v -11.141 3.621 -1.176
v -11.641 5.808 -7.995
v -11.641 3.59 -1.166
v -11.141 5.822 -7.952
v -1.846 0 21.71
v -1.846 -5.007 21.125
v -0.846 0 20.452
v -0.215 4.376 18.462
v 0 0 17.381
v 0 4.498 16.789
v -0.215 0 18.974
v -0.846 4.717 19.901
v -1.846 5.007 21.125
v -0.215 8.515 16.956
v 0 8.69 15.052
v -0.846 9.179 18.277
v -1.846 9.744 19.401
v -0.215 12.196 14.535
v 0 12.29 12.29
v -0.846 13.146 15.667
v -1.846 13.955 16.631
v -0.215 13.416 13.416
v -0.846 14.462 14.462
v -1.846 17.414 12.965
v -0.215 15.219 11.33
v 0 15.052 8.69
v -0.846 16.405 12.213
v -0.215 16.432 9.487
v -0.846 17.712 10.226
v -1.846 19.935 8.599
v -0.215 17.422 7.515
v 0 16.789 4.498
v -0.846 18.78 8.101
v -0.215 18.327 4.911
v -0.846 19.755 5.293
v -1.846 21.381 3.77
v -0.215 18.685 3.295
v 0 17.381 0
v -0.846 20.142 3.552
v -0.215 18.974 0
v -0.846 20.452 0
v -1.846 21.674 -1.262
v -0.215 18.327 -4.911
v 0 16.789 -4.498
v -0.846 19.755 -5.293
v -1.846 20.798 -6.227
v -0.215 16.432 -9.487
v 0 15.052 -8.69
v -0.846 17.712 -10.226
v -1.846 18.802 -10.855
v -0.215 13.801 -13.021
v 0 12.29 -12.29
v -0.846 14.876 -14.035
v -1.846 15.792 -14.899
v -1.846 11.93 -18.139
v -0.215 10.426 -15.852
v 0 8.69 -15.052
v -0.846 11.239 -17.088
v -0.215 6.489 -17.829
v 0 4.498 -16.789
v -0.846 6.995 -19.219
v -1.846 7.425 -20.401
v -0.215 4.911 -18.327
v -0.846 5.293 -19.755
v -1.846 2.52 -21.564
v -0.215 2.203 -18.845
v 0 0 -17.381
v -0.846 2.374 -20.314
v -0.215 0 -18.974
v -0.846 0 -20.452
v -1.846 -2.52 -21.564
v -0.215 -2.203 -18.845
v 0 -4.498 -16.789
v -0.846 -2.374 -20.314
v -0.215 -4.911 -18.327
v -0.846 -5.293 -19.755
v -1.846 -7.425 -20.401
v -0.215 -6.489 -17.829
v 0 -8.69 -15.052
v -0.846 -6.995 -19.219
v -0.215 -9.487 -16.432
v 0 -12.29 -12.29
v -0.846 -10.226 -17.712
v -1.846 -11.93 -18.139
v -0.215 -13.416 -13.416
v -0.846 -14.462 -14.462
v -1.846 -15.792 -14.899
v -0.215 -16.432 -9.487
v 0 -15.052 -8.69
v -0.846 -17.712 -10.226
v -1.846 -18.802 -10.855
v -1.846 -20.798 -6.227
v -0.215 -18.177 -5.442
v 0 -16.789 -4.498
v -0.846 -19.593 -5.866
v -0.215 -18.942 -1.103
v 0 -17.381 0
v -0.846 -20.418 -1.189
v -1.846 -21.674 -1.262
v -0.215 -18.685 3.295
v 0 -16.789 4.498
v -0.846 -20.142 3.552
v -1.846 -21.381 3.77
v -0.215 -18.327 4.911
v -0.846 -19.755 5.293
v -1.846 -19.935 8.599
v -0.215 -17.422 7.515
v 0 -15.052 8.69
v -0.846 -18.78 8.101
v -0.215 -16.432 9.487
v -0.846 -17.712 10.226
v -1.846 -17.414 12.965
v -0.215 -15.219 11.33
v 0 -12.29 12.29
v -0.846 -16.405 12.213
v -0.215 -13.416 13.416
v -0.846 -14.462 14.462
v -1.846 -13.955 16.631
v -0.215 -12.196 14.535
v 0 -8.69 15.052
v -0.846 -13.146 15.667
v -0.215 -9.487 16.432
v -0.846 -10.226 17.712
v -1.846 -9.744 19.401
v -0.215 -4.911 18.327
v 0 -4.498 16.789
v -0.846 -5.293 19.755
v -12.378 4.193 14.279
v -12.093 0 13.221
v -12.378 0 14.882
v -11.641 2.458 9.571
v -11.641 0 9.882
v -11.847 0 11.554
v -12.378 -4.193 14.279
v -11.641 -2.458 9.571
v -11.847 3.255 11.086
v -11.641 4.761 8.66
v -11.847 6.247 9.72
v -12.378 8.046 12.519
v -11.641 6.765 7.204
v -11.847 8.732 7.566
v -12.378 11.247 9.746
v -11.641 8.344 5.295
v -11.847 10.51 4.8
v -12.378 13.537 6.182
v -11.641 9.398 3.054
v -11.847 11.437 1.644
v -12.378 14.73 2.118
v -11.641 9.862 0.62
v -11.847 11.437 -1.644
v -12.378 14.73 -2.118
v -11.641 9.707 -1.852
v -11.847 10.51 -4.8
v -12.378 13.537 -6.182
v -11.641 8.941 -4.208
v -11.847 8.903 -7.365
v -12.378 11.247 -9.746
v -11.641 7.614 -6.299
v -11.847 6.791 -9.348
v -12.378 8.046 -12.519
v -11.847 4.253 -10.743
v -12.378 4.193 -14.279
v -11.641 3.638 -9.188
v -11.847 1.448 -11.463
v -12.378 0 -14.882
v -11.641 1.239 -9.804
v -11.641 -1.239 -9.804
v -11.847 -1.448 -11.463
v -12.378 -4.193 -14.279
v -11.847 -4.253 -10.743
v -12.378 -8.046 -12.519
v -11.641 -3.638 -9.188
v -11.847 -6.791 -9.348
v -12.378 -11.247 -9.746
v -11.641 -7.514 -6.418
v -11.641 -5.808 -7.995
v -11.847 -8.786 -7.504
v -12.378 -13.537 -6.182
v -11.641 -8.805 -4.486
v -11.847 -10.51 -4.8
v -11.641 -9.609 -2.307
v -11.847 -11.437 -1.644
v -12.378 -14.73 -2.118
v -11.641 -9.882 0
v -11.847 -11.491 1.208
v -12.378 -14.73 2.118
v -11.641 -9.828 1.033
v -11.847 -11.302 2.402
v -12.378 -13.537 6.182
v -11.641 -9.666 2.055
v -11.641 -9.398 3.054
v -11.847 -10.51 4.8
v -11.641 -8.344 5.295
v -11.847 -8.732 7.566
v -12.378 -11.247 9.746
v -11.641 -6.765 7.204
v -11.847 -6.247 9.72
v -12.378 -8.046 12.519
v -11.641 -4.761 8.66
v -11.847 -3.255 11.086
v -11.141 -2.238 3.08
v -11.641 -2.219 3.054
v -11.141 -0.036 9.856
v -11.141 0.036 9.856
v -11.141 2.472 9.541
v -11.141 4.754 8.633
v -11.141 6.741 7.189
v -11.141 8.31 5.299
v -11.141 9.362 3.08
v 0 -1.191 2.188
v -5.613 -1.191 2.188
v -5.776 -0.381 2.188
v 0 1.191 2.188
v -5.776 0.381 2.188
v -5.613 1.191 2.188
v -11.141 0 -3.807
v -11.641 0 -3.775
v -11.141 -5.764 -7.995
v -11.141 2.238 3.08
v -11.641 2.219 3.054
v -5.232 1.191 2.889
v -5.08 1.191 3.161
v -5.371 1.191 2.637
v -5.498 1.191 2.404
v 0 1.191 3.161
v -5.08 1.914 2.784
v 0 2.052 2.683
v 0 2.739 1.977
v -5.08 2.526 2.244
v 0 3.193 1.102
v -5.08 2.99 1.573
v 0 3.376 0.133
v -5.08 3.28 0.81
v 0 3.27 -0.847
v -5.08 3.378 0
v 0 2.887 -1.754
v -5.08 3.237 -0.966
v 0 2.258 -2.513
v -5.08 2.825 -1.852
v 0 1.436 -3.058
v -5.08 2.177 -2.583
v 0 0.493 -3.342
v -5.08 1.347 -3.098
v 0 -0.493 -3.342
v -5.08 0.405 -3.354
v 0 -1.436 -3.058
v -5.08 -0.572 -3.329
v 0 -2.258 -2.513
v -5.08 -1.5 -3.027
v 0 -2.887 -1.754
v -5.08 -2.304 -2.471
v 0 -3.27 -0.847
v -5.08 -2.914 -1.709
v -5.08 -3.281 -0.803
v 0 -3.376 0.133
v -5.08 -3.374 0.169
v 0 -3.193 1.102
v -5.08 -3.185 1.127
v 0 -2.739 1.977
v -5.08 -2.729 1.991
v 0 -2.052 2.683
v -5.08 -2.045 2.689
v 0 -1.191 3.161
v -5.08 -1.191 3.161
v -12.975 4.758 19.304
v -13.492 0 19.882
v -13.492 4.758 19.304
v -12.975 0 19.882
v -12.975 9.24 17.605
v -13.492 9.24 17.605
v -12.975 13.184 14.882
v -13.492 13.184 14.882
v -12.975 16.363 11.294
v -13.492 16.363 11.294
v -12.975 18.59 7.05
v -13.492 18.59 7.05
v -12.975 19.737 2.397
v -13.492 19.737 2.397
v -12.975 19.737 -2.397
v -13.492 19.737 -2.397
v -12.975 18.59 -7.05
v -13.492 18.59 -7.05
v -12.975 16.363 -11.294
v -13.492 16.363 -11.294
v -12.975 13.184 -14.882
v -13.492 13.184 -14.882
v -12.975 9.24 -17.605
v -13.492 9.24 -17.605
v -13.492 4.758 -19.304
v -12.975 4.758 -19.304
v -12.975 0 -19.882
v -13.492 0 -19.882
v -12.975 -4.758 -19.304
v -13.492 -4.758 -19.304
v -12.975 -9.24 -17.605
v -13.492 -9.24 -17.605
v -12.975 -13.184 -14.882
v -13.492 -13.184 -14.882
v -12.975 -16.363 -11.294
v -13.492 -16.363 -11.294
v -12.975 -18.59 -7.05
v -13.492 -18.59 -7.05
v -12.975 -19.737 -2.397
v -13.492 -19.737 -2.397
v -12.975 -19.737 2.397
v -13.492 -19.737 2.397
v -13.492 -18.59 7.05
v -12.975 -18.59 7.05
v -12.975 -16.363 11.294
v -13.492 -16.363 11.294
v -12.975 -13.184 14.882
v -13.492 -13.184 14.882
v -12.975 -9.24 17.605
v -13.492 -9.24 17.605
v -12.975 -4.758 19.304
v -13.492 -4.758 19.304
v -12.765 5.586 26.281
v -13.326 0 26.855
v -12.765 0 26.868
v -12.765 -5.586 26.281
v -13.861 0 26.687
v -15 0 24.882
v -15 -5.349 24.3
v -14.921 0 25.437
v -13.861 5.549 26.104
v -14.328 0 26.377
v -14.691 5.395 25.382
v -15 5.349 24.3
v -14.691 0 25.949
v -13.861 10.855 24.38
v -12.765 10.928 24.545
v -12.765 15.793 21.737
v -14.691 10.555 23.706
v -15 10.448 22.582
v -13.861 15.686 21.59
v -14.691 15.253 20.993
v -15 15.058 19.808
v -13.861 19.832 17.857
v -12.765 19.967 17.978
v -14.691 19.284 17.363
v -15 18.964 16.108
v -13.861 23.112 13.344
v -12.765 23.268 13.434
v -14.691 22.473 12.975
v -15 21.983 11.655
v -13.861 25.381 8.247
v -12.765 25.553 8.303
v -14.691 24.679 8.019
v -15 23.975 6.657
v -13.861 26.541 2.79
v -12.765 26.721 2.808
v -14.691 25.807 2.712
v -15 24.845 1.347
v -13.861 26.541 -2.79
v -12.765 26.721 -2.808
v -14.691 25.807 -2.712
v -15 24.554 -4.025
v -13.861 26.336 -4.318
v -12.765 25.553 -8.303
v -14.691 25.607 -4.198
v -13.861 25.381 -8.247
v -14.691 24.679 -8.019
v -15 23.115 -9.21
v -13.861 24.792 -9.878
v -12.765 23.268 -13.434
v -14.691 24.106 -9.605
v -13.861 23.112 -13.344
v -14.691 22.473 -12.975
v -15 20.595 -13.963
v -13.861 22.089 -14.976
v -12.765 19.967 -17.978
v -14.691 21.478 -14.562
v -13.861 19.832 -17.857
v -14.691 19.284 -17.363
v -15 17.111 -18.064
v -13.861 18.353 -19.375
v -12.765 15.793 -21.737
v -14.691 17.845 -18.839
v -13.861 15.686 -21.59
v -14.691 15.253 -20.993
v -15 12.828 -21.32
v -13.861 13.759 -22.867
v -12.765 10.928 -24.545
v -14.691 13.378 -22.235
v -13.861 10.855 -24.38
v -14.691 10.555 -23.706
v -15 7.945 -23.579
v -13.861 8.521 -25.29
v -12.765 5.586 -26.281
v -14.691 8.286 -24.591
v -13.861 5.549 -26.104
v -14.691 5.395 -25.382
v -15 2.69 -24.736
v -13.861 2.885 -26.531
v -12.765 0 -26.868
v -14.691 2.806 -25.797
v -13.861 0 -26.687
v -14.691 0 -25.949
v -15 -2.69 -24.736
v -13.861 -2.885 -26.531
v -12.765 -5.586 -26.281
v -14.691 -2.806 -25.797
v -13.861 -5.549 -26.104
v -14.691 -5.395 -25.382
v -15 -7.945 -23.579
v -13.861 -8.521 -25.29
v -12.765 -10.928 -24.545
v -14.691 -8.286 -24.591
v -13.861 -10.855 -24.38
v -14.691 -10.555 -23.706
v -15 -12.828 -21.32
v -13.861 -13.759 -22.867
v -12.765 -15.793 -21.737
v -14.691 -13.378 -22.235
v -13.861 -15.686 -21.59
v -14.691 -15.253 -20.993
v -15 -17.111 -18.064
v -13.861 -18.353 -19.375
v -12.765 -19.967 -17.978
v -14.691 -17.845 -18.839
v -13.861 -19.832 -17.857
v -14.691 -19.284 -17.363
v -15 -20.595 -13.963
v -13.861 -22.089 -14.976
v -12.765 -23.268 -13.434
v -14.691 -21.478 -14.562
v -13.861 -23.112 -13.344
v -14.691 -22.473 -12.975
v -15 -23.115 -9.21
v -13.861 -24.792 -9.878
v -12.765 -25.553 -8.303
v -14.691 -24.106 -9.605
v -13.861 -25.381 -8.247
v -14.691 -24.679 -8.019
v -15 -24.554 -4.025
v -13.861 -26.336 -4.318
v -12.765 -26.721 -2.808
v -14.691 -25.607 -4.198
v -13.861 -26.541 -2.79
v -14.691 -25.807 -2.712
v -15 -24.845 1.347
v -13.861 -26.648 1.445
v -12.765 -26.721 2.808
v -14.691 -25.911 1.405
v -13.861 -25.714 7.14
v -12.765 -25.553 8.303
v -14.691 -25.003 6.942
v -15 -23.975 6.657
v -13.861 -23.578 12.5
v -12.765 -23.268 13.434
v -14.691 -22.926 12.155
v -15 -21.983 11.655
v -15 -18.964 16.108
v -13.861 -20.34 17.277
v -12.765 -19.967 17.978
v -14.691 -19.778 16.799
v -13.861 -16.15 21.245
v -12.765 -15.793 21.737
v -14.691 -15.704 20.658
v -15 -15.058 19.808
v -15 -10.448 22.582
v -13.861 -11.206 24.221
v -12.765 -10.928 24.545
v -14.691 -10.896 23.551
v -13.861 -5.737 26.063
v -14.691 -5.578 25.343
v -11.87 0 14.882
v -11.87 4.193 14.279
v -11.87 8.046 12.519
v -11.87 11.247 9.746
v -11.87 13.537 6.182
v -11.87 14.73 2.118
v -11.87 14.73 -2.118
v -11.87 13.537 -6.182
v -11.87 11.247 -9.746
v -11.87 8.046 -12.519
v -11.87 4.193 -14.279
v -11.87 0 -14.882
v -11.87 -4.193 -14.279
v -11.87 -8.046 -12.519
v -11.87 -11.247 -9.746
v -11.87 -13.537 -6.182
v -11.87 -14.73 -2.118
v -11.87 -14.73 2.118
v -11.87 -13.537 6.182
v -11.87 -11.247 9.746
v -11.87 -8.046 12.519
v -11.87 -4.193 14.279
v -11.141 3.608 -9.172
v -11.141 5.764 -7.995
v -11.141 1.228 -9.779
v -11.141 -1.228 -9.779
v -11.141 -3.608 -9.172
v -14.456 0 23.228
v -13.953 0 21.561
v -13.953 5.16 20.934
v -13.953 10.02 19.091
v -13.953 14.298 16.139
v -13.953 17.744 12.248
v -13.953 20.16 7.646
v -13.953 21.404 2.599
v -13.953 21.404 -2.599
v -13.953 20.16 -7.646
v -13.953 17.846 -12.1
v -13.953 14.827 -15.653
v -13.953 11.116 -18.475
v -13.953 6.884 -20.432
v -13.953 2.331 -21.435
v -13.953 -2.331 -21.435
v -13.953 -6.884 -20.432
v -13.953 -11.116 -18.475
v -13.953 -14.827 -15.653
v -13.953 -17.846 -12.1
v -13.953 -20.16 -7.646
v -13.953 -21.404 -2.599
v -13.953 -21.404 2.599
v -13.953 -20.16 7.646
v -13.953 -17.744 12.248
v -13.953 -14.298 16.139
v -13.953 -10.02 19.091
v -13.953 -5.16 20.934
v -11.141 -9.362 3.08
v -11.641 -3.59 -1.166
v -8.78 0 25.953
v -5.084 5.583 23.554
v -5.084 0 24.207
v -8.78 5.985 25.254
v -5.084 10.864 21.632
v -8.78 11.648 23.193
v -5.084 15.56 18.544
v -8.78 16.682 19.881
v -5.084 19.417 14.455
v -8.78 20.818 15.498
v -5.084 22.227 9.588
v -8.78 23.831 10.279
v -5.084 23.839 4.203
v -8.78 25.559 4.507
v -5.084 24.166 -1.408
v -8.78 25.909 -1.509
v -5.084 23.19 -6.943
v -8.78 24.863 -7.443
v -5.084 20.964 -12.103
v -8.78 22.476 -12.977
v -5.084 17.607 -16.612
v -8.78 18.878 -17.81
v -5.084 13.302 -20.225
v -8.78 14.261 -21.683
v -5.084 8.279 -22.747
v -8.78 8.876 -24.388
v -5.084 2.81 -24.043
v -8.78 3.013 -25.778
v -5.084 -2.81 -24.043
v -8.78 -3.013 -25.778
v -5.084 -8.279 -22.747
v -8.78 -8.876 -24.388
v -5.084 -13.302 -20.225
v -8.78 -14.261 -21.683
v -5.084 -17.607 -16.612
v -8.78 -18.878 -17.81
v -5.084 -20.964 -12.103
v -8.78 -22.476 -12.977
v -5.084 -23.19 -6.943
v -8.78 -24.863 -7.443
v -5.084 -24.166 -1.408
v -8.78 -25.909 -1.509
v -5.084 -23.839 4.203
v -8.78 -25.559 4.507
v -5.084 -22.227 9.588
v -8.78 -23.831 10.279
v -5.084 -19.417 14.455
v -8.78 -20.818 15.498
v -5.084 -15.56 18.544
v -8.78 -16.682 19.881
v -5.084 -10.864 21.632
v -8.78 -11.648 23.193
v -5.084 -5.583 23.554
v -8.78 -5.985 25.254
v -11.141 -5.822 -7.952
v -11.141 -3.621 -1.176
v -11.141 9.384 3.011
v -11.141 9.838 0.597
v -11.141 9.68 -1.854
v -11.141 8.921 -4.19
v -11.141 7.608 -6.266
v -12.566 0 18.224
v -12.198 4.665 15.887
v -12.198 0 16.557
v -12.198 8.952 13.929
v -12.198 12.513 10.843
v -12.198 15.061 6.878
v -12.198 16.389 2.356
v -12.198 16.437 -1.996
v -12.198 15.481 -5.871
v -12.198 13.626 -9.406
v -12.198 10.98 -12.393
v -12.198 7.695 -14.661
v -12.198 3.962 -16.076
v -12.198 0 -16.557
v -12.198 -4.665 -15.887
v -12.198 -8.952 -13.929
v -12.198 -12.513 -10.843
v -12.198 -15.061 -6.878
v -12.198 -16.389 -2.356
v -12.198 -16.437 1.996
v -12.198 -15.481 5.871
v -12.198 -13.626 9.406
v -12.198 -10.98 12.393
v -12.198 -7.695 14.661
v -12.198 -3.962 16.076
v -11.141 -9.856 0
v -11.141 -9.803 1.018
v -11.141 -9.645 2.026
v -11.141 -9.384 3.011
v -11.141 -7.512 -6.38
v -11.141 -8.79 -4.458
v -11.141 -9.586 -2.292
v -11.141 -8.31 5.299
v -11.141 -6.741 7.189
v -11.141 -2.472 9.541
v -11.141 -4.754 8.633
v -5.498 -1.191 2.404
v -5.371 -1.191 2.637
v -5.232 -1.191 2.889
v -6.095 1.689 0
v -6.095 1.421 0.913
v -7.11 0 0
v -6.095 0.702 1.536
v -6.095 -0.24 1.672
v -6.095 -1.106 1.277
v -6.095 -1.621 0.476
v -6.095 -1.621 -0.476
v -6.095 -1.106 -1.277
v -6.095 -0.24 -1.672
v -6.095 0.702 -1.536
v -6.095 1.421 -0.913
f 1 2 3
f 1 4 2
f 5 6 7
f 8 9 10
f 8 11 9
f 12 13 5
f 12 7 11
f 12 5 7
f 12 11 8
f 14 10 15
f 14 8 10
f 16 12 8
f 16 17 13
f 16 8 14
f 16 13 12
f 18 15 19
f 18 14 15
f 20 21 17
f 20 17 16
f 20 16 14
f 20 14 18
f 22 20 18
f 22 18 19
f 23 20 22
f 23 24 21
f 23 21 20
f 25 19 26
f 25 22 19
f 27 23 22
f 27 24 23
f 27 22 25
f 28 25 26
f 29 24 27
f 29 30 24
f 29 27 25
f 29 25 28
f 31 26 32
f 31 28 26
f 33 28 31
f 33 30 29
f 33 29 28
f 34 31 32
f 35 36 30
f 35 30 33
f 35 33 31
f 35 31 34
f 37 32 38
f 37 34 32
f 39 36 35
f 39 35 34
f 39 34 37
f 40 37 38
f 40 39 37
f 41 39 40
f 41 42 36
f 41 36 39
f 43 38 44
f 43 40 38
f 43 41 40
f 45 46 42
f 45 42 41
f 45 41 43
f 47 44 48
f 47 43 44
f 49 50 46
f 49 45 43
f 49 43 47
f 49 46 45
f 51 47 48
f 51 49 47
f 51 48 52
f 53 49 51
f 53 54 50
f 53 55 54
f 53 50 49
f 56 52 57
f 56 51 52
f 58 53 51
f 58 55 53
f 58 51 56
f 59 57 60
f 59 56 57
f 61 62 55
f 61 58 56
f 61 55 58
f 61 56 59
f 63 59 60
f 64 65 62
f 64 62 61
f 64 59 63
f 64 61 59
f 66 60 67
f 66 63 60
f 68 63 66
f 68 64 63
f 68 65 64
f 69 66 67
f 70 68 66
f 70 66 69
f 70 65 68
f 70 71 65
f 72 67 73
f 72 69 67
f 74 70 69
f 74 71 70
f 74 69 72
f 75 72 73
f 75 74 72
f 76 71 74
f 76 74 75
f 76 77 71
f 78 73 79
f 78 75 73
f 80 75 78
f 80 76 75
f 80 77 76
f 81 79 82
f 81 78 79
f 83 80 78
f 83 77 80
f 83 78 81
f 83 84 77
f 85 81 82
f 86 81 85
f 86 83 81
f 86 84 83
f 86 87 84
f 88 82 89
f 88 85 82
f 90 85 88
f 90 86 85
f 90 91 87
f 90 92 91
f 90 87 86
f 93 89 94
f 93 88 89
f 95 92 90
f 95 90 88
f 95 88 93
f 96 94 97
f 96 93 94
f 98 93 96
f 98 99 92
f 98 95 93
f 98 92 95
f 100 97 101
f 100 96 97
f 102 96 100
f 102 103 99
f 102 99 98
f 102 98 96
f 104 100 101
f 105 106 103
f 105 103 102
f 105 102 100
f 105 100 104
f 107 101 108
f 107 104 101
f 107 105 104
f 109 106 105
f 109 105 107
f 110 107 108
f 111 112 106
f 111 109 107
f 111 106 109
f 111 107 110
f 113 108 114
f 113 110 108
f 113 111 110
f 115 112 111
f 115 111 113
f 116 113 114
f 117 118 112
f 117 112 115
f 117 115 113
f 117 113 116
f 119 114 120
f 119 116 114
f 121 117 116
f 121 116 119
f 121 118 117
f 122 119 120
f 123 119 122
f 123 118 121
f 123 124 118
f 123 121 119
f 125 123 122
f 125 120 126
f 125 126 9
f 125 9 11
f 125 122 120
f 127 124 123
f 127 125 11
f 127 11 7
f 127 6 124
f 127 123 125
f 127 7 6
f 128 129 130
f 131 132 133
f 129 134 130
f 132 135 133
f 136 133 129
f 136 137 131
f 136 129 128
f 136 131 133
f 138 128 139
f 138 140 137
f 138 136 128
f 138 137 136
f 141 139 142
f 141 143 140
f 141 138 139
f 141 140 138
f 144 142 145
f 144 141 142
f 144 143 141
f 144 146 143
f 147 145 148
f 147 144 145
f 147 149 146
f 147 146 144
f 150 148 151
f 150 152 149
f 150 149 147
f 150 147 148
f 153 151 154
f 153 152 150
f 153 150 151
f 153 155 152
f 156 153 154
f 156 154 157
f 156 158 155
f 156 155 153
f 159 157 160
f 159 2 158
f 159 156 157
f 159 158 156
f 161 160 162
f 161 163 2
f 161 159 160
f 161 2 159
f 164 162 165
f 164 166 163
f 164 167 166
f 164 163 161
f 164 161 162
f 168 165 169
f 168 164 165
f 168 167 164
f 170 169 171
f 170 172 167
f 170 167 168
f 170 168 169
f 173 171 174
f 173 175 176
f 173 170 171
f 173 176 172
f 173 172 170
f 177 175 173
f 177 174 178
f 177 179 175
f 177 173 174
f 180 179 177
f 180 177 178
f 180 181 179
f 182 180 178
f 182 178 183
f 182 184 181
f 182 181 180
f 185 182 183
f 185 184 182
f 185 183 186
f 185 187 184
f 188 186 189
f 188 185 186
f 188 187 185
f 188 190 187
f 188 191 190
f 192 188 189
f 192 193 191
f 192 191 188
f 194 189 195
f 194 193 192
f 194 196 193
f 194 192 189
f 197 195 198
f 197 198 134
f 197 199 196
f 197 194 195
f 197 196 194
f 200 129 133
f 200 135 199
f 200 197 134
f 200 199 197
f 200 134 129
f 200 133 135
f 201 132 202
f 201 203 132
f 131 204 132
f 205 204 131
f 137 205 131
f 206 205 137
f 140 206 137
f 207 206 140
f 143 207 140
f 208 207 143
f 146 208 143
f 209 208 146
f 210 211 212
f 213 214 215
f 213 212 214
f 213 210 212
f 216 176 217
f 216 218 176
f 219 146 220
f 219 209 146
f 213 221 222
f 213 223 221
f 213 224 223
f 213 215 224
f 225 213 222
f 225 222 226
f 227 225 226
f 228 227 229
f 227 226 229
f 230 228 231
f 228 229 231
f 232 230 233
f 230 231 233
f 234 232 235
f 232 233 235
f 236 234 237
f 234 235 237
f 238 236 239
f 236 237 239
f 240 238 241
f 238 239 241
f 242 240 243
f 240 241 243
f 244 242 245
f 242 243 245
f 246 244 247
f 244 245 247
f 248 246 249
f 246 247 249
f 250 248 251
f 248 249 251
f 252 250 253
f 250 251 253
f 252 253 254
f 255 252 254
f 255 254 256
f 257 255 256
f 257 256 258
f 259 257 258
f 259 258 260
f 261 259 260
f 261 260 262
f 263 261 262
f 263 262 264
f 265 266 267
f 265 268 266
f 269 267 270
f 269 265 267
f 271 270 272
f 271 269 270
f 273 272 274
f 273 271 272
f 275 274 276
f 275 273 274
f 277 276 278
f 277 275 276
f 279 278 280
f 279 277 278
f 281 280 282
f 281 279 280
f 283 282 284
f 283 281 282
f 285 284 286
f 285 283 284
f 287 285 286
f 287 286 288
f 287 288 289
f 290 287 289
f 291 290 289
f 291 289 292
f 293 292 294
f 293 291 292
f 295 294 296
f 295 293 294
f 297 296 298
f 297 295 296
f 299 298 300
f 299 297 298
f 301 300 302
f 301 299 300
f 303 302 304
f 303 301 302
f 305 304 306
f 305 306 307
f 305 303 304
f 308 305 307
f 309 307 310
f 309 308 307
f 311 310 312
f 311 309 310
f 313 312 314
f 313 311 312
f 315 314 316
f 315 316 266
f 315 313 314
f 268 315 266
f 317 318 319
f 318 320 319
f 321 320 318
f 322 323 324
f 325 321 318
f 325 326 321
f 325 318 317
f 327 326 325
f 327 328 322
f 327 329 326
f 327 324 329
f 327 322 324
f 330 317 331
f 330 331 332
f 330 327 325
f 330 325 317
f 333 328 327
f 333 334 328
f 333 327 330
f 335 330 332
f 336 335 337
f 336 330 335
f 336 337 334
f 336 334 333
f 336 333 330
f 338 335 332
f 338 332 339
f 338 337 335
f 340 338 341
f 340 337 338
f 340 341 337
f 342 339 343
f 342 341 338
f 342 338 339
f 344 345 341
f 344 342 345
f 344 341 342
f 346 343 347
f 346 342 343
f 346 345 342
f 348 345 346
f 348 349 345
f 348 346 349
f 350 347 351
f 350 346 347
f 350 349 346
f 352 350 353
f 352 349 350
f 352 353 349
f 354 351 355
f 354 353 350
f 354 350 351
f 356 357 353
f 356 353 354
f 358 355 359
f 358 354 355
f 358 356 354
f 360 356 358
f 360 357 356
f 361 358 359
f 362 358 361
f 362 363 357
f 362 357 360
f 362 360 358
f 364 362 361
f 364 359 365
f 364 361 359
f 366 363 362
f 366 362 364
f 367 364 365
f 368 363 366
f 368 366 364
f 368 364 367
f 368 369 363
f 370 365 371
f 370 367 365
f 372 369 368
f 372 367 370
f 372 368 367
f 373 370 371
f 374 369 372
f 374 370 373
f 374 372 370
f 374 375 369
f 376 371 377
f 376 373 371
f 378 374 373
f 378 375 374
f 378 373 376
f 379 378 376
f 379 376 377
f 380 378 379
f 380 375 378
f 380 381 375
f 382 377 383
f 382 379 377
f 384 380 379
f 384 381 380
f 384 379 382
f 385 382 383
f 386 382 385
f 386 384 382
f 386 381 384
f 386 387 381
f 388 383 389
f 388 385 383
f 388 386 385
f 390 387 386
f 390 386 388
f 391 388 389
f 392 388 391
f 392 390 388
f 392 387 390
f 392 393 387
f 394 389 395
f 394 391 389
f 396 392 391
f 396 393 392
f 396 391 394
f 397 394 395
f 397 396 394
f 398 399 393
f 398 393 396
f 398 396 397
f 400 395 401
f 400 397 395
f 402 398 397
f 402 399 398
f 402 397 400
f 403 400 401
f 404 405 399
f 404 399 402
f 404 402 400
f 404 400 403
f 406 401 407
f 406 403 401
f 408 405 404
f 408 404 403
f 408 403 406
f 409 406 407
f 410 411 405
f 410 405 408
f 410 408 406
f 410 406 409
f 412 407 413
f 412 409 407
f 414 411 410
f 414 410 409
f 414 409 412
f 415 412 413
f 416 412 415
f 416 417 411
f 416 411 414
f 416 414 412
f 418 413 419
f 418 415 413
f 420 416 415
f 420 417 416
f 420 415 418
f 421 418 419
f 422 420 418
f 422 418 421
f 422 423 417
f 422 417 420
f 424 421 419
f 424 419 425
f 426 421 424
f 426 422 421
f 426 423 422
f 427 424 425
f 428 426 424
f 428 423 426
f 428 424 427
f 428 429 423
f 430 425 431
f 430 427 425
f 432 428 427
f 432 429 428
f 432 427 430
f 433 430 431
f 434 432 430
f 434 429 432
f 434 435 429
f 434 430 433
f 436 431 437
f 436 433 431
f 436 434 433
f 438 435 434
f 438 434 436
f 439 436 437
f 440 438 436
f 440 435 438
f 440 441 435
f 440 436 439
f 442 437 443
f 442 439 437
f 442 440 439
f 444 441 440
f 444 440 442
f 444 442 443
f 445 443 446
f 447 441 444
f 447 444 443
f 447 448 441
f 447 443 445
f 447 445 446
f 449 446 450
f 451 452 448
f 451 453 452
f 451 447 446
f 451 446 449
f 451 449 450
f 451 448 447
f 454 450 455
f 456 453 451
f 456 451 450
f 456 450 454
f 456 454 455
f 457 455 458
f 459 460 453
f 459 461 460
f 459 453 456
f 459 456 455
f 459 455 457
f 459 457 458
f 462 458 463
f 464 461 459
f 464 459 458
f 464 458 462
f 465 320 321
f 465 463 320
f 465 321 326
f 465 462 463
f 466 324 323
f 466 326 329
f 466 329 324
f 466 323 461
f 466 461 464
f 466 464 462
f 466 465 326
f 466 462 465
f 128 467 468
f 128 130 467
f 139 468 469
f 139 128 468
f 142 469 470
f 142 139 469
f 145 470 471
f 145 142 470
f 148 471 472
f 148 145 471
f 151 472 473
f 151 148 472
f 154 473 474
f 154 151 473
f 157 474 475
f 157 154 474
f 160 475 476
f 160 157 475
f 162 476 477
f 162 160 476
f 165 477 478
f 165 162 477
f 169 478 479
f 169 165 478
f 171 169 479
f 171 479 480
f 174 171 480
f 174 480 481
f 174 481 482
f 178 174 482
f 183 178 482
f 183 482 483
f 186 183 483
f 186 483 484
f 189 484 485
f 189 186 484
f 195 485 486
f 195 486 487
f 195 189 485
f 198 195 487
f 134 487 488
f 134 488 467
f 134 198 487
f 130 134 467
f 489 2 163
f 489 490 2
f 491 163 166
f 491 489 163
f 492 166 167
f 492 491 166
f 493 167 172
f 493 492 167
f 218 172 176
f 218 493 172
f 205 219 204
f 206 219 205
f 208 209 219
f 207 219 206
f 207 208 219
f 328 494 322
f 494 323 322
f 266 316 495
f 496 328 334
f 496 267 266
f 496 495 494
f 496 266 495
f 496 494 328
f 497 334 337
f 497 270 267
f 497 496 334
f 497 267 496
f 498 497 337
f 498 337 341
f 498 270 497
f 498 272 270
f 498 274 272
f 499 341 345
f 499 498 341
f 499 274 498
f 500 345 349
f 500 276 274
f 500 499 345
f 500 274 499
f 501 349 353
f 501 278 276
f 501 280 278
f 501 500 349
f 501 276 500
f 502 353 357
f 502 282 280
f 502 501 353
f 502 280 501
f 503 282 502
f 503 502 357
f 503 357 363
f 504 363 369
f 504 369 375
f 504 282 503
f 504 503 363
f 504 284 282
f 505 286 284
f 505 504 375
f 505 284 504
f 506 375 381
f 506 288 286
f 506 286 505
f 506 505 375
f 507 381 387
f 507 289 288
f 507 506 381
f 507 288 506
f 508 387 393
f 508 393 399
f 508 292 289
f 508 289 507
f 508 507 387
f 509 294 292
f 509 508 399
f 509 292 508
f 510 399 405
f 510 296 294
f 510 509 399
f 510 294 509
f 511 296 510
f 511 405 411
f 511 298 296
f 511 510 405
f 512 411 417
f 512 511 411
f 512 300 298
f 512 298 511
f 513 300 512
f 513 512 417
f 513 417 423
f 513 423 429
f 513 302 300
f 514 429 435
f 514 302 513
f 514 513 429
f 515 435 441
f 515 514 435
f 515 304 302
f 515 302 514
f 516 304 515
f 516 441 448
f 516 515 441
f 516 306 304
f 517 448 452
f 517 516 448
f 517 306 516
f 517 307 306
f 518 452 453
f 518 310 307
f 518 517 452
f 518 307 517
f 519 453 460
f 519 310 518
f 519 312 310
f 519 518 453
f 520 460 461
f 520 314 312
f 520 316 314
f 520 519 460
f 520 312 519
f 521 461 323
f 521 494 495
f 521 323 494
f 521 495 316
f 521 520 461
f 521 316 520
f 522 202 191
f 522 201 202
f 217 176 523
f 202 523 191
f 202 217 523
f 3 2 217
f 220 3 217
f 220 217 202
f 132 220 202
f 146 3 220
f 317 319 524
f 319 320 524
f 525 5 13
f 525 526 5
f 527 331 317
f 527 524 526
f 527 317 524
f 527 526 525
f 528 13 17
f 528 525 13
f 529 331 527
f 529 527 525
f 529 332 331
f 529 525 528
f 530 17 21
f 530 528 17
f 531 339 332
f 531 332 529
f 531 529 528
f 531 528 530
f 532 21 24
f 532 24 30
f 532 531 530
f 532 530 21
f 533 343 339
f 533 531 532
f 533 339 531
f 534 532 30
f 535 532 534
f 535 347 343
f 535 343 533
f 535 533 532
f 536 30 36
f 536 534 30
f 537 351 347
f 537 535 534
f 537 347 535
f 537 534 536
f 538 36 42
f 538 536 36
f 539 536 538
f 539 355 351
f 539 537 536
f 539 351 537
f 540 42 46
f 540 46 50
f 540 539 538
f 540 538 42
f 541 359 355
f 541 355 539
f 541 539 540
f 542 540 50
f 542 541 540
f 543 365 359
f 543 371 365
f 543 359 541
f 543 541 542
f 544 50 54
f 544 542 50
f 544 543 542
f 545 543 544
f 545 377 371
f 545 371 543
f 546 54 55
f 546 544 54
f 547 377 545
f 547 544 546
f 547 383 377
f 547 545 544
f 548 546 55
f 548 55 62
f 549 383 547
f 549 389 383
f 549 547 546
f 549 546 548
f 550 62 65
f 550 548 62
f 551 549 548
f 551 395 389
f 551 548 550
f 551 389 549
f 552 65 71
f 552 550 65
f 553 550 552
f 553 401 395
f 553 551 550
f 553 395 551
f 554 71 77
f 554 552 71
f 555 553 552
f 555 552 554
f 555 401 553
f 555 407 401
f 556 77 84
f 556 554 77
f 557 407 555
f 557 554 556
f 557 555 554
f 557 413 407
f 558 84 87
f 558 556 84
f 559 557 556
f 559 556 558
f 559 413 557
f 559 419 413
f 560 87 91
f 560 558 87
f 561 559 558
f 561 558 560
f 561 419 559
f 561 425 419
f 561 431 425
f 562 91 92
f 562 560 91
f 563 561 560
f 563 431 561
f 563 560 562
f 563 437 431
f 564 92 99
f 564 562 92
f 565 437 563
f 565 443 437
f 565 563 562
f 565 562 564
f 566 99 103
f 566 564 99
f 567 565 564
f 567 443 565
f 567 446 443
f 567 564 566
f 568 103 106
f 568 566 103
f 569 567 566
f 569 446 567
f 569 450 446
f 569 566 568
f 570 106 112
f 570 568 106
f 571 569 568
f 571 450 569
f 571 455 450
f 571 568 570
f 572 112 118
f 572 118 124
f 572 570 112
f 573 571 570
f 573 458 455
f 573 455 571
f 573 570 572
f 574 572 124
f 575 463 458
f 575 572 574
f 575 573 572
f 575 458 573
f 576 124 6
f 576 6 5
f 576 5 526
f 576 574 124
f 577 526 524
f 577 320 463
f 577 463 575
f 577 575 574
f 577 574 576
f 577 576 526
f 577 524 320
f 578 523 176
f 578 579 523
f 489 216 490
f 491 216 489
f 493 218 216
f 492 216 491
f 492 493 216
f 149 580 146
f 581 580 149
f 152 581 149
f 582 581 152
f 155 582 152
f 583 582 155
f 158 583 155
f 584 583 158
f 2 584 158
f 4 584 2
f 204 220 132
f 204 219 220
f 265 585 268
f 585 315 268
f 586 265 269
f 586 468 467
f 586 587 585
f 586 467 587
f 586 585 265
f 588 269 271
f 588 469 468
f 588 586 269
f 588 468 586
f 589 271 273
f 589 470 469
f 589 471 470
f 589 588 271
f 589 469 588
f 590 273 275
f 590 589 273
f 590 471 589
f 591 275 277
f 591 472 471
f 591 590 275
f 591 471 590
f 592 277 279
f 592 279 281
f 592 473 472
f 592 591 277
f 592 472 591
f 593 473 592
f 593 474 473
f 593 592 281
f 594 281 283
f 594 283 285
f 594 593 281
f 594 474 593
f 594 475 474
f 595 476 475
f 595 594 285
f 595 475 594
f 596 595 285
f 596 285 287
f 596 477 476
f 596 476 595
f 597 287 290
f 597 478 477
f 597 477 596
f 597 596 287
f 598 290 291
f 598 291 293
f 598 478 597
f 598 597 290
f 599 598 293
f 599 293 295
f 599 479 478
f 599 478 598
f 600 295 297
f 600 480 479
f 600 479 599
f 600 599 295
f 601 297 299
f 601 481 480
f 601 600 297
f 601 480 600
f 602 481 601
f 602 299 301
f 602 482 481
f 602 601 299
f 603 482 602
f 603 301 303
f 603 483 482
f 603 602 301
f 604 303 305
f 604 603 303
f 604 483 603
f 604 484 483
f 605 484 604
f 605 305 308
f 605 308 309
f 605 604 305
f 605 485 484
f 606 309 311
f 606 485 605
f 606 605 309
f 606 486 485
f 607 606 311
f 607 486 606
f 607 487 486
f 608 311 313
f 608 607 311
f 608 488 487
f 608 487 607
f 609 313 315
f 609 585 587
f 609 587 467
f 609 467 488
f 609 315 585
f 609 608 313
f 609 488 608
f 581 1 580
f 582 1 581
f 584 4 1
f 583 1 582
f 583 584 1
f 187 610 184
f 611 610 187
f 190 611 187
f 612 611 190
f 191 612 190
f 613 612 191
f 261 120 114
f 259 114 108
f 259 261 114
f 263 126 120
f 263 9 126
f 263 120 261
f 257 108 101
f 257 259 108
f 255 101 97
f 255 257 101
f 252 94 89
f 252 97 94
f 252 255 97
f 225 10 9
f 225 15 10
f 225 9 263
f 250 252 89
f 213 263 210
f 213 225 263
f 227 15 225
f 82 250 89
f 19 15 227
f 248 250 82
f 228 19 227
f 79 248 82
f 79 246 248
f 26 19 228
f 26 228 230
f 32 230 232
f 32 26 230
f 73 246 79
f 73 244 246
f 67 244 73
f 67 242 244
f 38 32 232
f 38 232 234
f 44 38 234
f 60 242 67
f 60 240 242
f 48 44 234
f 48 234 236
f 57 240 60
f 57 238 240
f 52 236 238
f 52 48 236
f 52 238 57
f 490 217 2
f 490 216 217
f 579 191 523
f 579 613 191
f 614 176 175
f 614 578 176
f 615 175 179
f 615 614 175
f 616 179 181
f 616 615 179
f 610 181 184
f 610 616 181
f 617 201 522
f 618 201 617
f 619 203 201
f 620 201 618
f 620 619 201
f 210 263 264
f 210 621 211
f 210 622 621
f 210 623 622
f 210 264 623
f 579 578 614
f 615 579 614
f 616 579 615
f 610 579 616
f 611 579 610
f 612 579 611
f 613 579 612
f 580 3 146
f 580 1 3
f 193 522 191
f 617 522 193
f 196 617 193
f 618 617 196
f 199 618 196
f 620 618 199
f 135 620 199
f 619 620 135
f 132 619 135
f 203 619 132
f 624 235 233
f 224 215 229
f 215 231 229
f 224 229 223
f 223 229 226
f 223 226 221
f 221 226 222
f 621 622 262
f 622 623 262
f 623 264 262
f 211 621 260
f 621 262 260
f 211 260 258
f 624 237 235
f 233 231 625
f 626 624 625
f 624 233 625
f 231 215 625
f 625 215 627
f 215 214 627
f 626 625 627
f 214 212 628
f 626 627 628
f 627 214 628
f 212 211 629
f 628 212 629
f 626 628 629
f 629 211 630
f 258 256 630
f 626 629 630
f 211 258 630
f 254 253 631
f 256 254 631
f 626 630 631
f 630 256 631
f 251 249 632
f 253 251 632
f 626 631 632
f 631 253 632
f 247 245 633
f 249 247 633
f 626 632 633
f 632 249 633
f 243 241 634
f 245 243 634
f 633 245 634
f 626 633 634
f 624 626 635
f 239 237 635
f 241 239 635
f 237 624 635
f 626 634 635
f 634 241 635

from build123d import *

# Parameters (mm, degrees)
F3_D     = 6.7564
F3_DEPTH = 5.08
F3_TIP   = 2.0298273432
F7_DEPTH = 0.5
F7_TAPER = 3


with BuildPart() as f1:
    # F0 (on Front) → F1 (revolve)
    with BuildSketch(Plane.XZ):
        with BuildLine():
            Line((-10.7497593308, 0), (0, 0))
            Line((0, 0), (0, 17.3808315196))
            ThreePointArc((0, 17.3808315196), (-0.480802734, 19.7342251413), (-1.8461538462, 21.7104460672))
            ThreePointArc((-1.8461538462, 21.7104460672), (-6.884789629, 25.1797369198), (-12.7647058824, 26.8680539592))
            ThreePointArc((-12.7647058824, 26.8680539592), (-14.3284223283, 26.3770330193), (-15, 24.8819430161))
            ThreePointArc((-15, 24.8819430161), (-14.1991722099, 22.3960149141), (-13.4916369321, 19.8819430161))
            Line((-13.4916369321, 19.8819430161), (-12.9749619928, 19.8819430161))
            ThreePointArc((-12.9749619928, 19.8819430161), (-12.3770619061, 17.3919785968), (-11.8699833059, 14.8819430161))
            Line((-11.8699833059, 14.8819430161), (-12.3783641122, 14.8819430161))
            ThreePointArc((-12.3783641122, 14.8819430161), (-11.9646485976, 12.3885980327), (-11.6412133462, 9.8819430161))
            ThreePointArc((-11.6412133462, 9.8819430161), (-11.2708718222, 4.9478890349), (-11.25, 0))
            Line((-11.25, 0), (-10.7497593308, 0))
        make_face()
        with BuildLine():
            Line((-11.6412133462, 0), (-11.25, 0))
            ThreePointArc((-11.25, 0), (-11.2708718222, 4.9478890349), (-11.6412133462, 9.8819430161))
            Line((-11.6412133462, 9.8819430161), (-11.6412133462, 0))
        make_face()
    revolve(axis=Axis((-7.5, 0, 0), (-1, 0, 0)))

    # F3
    with Locations(Plane.YZ):
        with Locations((0, 0)):
            Hole(F3_D / 2, depth=F3_DEPTH)
            with Locations((0, 0, -(F3_DEPTH + F3_TIP / 2))):  # 118° drill point
                Cone(0, F3_D / 2, F3_TIP, mode=Mode.SUBTRACT)

    # F4 (on face) → F5 (join, up to the next surface of F1)
    with BuildSketch(Plane.YZ):
        with BuildLine():
            Line((-1.190625, 2.187575), (1.190625, 2.187575))
            Line((1.190625, 2.187575), (1.190625, 3.1614312185))
            ThreePointArc((1.190625, 3.1614312185), (0, 3.3782), (-1.190625, 3.1614312185))
            Line((-1.190625, 3.1614312185), (-1.190625, 2.187575))
        make_face()
    extrude(until=Until.NEXT, dir=(-1, 0, 0))

    # F6 (on face) → F7 (cut)
    with BuildSketch(Plane(origin=(-11.6412133462, 0, 0), x_dir=(0, -1, 0), z_dir=(-1, 0, 0))):
        with BuildLine():
            ThreePointArc((9.3982862992, 3.0536883294), (5.8084603689, 7.9946598375), (0, 9.8819430161))
            Line((0, 9.8819430161), (2.2186344386, 3.0536883294))
            Line((2.2186344386, 3.0536883294), (9.3982862992, 3.0536883294))
        make_face()
        with BuildLine():
            Line((-3.5898259303, -1.1664051508), (-9.3982862992, 3.0536883294))
            ThreePointArc((-9.3982862992, 3.0536883294), (-9.3982862992, -3.0536883294), (-5.8084603689, -7.9946598375))
            Line((-5.8084603689, -7.9946598375), (-3.5898259303, -1.1664051508))
        make_face()
        with BuildLine():
            Line((0, -3.7745663573), (-5.8084603689, -7.9946598375))
            ThreePointArc((-5.8084603689, -7.9946598375), (0, -9.8819430161), (5.8084603689, -7.9946598375))
            Line((5.8084603689, -7.9946598375), (0, -3.7745663573))
        make_face()
        with BuildLine():
            ThreePointArc((9.8819430161, 0), (9.7602798995, 1.5458764693), (9.3982862992, 3.0536883294))
            Line((9.3982862992, 3.0536883294), (3.5898259303, -1.1664051508))
            Line((3.5898259303, -1.1664051508), (5.8084603689, -7.9946598375))
            ThreePointArc((5.8084603689, -7.9946598375), (8.804875699, -4.4863082483), (9.8819430161, 0))
        make_face()
        with BuildLine():
            Line((-2.2186344386, 3.0536883294), (0, 9.8819430161))
            ThreePointArc((0, 9.8819430161), (-5.8084603689, 7.9946598375), (-9.3982862992, 3.0536883294))
            Line((-9.3982862992, 3.0536883294), (-2.2186344386, 3.0536883294))
        make_face()
    extrude(amount=-F7_DEPTH, taper=F7_TAPER, mode=Mode.SUBTRACT)


solid = f1.part
